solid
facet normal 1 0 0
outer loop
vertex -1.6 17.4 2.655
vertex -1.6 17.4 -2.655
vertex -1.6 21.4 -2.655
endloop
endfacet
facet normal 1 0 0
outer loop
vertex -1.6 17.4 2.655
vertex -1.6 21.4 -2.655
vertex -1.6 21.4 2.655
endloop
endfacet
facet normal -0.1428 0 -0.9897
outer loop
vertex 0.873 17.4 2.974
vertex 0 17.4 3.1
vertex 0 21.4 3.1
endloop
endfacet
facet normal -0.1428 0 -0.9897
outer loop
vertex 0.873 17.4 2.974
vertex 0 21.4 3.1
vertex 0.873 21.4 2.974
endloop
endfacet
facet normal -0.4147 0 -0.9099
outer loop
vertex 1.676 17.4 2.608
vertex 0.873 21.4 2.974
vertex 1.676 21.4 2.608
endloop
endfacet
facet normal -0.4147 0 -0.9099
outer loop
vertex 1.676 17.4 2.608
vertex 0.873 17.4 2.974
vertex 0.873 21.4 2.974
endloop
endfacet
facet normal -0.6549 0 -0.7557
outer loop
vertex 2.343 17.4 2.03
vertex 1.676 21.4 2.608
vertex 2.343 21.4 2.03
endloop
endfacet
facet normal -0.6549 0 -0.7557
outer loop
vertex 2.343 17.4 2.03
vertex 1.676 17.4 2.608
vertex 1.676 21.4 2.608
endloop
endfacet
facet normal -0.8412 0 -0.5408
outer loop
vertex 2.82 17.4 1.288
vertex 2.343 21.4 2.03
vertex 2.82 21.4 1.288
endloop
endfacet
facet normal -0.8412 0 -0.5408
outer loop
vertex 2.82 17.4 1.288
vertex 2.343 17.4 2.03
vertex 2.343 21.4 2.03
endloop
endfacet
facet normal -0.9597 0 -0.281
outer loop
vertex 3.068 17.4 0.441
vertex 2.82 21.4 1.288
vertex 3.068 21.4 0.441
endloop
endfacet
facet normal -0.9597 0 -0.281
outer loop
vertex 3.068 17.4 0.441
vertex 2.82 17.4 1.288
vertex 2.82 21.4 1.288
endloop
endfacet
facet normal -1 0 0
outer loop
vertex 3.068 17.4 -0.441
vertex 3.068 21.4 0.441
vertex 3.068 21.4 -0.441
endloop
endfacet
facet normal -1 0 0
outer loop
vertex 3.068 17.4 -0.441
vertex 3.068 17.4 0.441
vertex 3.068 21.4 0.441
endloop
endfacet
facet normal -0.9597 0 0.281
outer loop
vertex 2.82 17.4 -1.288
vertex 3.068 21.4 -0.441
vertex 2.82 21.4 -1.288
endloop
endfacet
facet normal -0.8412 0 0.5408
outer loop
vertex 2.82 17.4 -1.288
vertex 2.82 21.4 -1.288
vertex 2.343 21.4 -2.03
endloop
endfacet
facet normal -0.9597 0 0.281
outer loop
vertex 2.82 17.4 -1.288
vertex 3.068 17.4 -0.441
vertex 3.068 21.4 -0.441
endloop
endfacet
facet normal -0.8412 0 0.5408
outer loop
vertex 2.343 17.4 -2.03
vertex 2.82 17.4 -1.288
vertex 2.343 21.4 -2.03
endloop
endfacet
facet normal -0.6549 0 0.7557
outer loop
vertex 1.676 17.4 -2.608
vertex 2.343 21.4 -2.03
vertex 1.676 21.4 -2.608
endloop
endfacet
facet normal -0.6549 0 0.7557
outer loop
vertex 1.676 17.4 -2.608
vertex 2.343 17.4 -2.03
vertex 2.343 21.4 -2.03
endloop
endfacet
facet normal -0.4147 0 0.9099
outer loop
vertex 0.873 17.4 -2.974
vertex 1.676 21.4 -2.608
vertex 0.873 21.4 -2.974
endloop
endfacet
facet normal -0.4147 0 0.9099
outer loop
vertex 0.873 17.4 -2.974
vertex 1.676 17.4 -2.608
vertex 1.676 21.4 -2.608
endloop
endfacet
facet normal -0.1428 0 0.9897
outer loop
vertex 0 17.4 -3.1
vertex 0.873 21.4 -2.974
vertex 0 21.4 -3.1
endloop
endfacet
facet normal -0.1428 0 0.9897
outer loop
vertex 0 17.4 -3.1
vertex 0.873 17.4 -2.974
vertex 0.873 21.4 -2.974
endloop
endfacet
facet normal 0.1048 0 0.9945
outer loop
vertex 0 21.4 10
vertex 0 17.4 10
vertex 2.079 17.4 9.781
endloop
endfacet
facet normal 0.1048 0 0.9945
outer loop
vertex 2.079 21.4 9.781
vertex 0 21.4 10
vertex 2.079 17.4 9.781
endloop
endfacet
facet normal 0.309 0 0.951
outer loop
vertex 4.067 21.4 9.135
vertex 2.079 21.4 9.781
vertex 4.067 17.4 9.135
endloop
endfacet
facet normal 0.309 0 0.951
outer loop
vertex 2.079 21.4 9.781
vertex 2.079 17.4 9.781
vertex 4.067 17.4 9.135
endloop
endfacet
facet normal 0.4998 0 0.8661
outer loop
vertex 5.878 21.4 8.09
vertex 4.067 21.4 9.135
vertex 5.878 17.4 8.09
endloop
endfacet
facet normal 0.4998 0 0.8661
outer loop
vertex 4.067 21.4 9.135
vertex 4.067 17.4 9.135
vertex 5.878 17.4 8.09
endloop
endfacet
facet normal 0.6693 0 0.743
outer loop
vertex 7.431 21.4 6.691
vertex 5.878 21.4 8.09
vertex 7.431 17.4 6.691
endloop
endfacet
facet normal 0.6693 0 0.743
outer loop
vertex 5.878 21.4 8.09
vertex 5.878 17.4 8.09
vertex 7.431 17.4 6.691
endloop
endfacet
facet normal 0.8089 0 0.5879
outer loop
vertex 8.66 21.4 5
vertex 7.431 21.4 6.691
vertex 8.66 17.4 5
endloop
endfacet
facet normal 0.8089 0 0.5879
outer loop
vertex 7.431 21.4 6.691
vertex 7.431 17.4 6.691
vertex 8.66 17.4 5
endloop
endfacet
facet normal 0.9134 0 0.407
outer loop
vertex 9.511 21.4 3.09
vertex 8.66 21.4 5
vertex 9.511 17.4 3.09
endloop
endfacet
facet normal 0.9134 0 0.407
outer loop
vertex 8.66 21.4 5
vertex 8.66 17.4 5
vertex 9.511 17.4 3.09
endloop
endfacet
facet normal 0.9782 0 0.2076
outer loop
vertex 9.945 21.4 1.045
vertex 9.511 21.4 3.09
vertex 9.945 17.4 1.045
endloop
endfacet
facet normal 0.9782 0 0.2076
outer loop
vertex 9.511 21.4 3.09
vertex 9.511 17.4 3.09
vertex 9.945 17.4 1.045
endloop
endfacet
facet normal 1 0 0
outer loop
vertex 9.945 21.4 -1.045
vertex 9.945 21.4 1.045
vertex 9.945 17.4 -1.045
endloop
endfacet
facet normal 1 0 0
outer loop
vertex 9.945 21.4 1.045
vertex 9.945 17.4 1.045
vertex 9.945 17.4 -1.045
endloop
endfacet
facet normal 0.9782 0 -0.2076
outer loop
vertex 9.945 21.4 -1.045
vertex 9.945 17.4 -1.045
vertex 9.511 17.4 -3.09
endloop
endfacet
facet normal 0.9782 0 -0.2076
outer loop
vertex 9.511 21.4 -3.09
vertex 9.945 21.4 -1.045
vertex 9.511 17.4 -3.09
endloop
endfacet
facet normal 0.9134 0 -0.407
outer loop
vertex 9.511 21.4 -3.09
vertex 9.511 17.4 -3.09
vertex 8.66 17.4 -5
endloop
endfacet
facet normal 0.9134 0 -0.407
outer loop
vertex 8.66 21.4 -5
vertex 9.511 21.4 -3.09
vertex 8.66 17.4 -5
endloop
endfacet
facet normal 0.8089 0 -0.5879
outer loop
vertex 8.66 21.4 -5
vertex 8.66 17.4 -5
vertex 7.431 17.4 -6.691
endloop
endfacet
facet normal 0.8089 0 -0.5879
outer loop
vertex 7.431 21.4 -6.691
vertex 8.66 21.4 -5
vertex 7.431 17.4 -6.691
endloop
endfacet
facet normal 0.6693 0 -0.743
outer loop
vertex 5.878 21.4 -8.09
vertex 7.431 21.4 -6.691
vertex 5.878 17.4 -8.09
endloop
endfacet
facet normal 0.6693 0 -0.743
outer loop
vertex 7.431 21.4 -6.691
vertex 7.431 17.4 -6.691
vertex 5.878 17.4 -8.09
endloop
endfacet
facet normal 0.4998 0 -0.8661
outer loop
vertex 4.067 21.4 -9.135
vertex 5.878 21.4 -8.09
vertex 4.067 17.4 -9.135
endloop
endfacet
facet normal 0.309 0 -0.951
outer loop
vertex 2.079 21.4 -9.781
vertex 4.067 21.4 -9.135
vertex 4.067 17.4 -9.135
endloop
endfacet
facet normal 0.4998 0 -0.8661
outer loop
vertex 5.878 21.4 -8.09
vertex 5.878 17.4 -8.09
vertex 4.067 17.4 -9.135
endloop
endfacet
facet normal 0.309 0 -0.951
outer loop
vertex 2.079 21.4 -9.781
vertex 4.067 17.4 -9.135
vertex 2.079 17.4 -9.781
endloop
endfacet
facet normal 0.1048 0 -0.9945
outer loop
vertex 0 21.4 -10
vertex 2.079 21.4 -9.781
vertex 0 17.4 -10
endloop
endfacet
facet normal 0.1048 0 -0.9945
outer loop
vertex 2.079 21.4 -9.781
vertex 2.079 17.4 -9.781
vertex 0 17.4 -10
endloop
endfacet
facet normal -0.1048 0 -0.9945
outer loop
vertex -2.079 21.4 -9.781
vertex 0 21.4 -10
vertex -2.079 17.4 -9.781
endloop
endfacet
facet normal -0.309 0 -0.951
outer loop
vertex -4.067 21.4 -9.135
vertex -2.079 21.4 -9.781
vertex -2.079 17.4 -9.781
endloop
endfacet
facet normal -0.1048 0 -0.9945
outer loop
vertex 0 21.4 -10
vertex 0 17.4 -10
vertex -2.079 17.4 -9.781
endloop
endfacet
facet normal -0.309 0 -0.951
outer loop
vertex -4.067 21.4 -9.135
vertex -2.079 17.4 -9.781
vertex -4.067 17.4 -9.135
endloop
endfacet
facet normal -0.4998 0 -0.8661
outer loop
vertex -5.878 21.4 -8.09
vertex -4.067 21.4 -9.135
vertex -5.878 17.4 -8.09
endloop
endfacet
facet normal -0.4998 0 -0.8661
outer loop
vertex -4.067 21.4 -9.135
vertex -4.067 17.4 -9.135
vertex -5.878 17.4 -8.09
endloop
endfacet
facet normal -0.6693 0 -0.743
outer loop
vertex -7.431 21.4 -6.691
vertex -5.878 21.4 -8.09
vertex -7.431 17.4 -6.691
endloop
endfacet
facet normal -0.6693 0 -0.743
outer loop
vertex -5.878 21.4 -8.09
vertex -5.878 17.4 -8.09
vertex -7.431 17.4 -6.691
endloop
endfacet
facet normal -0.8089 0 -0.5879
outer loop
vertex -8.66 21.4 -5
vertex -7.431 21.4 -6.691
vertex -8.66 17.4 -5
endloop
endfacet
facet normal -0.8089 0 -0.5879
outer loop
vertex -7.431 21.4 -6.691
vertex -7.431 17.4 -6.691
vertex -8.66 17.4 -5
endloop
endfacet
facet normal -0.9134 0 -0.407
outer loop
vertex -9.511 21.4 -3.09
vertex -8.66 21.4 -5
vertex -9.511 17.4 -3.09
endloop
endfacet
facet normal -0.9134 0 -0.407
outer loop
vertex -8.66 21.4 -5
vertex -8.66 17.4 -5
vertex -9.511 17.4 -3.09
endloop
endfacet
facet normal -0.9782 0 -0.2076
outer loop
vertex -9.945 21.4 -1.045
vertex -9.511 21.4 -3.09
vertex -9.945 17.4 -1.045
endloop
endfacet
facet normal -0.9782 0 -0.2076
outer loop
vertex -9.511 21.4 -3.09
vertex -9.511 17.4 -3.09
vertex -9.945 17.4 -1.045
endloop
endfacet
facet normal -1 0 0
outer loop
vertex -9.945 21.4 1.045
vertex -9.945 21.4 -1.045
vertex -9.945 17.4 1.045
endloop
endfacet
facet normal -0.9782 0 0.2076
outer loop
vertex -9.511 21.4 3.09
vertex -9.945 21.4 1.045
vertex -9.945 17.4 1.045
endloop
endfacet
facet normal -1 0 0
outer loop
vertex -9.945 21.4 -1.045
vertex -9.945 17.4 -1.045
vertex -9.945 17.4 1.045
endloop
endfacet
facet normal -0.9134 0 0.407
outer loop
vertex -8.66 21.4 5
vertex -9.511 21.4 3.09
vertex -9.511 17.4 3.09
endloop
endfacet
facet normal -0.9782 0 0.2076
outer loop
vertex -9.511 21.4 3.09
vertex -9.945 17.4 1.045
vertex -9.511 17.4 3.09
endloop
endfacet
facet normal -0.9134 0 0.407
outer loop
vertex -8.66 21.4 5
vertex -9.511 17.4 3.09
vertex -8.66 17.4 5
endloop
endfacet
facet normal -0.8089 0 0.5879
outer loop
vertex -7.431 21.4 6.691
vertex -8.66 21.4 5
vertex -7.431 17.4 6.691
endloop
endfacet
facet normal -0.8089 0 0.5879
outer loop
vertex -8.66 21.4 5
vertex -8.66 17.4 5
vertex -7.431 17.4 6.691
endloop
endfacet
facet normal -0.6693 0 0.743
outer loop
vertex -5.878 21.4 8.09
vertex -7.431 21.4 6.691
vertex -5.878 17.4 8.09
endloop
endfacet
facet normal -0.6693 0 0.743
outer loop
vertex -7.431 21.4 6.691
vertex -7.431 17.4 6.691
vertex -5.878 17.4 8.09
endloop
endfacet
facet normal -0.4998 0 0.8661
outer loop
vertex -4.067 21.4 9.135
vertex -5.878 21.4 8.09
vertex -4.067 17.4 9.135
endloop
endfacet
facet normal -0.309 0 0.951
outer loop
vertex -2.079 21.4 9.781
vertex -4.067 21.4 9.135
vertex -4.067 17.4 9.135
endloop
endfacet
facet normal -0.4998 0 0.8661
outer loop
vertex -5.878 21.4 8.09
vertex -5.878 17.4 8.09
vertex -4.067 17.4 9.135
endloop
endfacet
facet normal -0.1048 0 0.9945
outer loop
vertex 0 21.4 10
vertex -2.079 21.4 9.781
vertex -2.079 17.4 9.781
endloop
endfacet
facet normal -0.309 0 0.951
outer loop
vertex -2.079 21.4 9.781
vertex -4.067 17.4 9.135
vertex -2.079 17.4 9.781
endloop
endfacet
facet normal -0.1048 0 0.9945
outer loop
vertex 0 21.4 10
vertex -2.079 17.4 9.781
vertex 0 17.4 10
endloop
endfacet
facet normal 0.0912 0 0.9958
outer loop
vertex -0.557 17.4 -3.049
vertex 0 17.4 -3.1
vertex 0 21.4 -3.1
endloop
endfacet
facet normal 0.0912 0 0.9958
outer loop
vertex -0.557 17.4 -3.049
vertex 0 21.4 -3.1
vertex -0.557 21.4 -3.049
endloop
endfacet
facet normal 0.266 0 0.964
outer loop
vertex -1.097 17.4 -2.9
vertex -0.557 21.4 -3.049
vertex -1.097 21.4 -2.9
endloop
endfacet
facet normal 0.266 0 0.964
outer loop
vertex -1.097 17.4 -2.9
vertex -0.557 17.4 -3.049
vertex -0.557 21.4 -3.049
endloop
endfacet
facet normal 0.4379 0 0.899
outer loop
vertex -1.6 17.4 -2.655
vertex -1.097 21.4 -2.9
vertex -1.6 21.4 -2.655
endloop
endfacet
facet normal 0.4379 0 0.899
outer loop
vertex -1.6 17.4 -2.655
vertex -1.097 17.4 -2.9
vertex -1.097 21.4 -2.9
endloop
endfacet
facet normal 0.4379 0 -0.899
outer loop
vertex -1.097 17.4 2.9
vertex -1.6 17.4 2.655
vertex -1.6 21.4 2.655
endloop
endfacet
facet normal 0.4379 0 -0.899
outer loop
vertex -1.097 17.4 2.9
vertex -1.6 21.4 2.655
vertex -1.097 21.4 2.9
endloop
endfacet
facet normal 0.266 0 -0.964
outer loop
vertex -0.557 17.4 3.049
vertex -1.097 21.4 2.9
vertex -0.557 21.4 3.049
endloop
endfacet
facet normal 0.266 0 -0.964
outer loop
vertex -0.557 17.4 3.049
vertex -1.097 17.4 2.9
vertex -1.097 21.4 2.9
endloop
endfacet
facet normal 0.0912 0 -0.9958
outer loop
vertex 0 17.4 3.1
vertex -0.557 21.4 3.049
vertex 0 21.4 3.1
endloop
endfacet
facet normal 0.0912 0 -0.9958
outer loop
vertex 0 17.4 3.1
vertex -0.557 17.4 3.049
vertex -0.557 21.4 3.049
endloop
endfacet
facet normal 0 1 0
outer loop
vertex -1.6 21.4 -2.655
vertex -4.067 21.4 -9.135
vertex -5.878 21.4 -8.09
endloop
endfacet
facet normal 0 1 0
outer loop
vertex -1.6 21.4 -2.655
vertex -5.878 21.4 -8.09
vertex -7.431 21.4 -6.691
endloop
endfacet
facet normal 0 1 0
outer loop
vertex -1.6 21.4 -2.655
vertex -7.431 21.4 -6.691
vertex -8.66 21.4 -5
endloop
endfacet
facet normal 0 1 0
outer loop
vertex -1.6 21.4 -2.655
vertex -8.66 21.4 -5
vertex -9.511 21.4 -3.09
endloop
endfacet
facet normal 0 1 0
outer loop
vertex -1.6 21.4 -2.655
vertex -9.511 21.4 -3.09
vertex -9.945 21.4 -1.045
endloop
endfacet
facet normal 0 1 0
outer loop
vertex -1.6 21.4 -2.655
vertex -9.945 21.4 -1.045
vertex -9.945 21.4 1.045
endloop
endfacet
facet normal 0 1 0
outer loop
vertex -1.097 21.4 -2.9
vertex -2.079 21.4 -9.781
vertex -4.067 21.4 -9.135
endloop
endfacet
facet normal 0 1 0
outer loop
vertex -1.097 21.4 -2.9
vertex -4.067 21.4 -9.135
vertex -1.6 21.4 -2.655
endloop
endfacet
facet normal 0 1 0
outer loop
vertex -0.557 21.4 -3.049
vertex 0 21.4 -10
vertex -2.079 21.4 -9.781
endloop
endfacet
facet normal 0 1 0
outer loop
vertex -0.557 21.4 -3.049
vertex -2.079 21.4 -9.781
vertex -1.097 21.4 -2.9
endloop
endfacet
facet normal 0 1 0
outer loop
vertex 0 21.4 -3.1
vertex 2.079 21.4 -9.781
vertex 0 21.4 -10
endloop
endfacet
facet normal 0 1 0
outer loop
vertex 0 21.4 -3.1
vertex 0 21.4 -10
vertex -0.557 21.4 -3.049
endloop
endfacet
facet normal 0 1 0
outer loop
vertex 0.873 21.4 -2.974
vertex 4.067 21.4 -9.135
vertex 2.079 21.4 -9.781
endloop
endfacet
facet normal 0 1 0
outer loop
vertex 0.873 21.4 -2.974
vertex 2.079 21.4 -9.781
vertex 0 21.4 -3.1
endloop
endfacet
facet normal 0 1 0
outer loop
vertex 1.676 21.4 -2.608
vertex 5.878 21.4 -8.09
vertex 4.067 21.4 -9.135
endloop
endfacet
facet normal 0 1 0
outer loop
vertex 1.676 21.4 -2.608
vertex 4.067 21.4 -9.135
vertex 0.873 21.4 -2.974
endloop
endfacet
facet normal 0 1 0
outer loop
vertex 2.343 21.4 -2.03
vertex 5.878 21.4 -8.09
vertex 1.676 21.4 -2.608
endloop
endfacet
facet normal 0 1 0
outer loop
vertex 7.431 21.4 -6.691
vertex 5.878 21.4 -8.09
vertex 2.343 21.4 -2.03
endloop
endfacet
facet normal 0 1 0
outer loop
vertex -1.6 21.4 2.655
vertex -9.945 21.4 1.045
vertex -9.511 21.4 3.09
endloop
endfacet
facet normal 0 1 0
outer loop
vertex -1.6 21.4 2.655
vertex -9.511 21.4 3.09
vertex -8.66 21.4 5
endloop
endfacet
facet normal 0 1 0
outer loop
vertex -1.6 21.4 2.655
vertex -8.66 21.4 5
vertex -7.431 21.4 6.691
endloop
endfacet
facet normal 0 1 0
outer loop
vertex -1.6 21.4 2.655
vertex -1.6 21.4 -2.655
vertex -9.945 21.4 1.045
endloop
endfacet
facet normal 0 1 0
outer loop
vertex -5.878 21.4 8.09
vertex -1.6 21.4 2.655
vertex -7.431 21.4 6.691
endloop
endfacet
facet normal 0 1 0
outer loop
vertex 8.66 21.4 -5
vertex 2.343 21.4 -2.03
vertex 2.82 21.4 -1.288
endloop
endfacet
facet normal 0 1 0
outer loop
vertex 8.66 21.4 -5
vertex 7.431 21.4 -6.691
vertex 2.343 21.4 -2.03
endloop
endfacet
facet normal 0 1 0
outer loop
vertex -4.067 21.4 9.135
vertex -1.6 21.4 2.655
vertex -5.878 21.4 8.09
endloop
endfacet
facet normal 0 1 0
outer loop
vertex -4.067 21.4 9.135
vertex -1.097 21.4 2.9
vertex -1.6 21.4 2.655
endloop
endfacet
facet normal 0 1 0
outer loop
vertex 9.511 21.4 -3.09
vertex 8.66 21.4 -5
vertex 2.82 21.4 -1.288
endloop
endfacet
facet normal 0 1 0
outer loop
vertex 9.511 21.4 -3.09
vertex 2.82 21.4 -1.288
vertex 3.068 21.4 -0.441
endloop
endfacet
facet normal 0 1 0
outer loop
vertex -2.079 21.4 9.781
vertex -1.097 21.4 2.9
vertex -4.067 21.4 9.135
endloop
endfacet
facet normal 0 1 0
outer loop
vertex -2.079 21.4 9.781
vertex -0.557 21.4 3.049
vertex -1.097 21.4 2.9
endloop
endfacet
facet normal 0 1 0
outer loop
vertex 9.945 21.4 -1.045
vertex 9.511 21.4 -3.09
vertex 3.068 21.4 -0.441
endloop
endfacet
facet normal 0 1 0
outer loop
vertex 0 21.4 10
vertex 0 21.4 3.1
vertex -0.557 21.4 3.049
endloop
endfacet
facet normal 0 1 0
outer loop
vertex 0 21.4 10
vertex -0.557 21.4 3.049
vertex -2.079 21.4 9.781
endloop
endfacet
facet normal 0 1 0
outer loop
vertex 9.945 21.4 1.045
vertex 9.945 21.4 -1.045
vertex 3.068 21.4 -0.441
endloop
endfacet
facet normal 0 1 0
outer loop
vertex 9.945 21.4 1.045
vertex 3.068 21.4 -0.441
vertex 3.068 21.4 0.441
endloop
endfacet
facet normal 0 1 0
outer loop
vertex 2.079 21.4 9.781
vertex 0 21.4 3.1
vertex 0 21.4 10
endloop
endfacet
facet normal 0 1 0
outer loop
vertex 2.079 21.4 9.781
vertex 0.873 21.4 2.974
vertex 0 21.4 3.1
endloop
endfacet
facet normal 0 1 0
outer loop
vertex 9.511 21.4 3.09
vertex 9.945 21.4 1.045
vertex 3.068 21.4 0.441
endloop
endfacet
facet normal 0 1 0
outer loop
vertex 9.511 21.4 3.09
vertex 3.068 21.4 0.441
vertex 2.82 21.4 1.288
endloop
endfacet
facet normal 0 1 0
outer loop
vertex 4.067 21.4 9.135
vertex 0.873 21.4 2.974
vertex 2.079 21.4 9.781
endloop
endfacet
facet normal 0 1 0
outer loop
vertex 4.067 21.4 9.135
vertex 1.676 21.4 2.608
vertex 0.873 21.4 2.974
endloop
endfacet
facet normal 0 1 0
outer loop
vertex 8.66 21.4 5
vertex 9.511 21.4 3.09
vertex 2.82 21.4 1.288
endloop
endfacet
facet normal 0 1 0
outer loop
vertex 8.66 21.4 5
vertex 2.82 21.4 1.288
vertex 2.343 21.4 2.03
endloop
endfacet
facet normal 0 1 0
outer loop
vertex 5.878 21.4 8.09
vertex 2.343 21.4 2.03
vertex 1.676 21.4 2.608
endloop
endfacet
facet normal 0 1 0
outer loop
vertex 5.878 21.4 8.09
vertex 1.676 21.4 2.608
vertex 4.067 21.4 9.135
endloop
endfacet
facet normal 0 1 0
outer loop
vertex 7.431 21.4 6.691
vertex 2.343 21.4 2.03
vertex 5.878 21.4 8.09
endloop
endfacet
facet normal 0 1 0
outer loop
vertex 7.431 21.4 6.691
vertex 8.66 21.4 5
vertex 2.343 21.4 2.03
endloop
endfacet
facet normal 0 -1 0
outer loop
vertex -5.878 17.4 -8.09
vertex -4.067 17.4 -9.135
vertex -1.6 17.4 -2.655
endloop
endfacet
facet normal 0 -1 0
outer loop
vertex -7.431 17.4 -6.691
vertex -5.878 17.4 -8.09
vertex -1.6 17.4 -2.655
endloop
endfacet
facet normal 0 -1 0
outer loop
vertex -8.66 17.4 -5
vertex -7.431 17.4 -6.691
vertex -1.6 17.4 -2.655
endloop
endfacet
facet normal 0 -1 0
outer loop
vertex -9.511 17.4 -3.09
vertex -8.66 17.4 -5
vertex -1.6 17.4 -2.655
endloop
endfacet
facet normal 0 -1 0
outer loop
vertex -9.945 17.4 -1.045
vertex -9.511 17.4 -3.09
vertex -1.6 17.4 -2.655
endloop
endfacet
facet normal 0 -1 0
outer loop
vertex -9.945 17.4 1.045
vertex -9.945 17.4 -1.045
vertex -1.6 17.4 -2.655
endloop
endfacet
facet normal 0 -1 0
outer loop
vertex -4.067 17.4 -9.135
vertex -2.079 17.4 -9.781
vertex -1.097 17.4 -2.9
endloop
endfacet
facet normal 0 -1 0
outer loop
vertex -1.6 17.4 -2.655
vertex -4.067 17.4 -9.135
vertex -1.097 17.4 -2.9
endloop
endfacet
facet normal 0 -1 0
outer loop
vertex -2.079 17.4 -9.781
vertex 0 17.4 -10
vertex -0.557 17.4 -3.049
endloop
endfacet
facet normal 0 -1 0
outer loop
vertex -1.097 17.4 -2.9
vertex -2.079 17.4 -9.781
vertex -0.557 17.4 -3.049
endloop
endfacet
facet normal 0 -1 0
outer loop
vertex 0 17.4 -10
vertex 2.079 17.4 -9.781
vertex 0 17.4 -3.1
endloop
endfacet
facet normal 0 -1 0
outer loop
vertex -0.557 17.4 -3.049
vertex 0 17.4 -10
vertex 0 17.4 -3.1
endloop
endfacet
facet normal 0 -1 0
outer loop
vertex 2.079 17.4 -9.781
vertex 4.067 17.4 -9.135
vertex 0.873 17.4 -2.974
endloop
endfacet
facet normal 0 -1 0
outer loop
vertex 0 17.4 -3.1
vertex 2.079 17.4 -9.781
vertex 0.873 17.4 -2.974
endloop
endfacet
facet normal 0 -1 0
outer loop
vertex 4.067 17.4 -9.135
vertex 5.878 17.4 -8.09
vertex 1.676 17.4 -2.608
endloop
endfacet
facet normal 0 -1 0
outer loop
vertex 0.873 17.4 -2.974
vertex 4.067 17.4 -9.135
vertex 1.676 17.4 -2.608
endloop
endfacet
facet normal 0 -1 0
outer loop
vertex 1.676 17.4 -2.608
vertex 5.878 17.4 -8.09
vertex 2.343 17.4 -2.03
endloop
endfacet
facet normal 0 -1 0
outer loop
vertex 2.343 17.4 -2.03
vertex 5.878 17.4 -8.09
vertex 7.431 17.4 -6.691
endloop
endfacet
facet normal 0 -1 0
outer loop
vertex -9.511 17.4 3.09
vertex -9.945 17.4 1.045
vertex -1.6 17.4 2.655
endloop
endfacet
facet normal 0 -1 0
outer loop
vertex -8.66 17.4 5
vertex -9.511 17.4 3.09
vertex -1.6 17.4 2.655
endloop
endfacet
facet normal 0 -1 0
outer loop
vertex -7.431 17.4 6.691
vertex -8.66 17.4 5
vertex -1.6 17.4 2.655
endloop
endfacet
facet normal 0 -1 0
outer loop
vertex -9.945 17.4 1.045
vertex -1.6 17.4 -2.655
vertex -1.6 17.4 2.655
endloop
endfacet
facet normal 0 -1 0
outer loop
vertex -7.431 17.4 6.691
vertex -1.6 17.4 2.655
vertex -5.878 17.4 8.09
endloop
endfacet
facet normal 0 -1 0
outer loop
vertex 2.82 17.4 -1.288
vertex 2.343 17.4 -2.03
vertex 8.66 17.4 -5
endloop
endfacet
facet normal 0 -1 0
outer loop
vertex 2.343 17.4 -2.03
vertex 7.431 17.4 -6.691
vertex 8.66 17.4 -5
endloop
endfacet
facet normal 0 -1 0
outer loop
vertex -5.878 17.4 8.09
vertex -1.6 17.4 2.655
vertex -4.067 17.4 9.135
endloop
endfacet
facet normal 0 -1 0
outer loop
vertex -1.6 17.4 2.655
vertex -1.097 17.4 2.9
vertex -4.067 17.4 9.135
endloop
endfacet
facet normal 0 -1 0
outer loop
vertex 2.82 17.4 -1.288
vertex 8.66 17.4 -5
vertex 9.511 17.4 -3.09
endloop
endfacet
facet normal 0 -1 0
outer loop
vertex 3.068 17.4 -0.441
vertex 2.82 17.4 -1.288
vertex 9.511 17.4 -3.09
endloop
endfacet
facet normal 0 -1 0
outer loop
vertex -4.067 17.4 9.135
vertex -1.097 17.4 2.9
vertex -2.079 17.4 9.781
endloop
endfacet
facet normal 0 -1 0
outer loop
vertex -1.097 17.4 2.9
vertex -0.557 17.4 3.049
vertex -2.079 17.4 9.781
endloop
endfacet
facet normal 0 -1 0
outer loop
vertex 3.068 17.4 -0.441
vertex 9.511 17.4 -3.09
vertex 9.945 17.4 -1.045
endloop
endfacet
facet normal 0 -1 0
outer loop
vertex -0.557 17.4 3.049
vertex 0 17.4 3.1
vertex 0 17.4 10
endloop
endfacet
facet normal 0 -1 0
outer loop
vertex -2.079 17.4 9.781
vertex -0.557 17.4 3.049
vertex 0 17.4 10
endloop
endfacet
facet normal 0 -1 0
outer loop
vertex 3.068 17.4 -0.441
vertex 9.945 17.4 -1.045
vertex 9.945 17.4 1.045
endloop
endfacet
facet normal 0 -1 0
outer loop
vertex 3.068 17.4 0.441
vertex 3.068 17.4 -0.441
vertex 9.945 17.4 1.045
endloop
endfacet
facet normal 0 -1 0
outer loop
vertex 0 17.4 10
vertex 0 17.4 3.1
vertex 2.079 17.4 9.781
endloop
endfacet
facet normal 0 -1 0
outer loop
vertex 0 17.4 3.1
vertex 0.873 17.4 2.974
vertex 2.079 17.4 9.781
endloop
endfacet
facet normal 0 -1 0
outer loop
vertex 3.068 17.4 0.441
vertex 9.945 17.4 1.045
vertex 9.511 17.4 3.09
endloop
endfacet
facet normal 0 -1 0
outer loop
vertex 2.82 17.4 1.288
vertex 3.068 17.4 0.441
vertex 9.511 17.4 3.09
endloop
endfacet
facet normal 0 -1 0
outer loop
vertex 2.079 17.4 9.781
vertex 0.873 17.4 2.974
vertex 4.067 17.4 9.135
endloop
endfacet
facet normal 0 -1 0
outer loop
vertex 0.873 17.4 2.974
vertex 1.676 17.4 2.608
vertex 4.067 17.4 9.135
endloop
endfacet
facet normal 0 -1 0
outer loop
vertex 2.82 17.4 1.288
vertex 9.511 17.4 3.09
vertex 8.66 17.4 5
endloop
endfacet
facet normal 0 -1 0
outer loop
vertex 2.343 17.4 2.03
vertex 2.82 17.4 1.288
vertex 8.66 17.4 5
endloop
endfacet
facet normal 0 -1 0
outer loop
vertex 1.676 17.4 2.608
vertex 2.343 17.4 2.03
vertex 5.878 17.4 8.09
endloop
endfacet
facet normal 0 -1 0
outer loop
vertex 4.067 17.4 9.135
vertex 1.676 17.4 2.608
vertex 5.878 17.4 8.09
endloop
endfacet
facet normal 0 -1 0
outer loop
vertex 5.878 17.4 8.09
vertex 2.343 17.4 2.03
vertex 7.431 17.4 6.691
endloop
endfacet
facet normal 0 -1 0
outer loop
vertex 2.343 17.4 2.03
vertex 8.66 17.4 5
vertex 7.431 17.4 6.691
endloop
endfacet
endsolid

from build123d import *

# Parameters (mm, degrees)
BOSS_EXTRU_1_START = 17.4
ESQUISSE1_R        = 10
BOSS_EXTRU_1_DEPTH = 4


with BuildPart() as part:
    # Esquisse1 → Boss.-Extru.1 (new body)
    with BuildSketch(Plane(origin=(0, 0, 0), x_dir=(1, 0, 0), z_dir=(0, 1, 0)).offset(BOSS_EXTRU_1_START)):
        with Locations(Location((0, 0, 0), (0, 0, 270))):
            Circle(ESQUISSE1_R)
        with BuildLine():
            Line((-1.6, -2.244994432), (-1.6, -2.655183609))
            ThreePointArc((-1.6, -2.655183609), (-0.830340536, -2.986726401), (0, -3.1))
            ThreePointArc((0, -3.1), (3.1, 0), (0, 3.1))
            ThreePointArc((0, 3.1), (-0.830340536, 2.986726401), (-1.6, 2.655183609))
            Line((-1.6, 2.655183609), (-1.6, 2.244994432))
            Line((-1.6, 2.244994432), (-1.6, -2.244994432))
        make_face(mode=Mode.SUBTRACT)
    extrude(amount=BOSS_EXTRU_1_DEPTH)


solid = part.part
